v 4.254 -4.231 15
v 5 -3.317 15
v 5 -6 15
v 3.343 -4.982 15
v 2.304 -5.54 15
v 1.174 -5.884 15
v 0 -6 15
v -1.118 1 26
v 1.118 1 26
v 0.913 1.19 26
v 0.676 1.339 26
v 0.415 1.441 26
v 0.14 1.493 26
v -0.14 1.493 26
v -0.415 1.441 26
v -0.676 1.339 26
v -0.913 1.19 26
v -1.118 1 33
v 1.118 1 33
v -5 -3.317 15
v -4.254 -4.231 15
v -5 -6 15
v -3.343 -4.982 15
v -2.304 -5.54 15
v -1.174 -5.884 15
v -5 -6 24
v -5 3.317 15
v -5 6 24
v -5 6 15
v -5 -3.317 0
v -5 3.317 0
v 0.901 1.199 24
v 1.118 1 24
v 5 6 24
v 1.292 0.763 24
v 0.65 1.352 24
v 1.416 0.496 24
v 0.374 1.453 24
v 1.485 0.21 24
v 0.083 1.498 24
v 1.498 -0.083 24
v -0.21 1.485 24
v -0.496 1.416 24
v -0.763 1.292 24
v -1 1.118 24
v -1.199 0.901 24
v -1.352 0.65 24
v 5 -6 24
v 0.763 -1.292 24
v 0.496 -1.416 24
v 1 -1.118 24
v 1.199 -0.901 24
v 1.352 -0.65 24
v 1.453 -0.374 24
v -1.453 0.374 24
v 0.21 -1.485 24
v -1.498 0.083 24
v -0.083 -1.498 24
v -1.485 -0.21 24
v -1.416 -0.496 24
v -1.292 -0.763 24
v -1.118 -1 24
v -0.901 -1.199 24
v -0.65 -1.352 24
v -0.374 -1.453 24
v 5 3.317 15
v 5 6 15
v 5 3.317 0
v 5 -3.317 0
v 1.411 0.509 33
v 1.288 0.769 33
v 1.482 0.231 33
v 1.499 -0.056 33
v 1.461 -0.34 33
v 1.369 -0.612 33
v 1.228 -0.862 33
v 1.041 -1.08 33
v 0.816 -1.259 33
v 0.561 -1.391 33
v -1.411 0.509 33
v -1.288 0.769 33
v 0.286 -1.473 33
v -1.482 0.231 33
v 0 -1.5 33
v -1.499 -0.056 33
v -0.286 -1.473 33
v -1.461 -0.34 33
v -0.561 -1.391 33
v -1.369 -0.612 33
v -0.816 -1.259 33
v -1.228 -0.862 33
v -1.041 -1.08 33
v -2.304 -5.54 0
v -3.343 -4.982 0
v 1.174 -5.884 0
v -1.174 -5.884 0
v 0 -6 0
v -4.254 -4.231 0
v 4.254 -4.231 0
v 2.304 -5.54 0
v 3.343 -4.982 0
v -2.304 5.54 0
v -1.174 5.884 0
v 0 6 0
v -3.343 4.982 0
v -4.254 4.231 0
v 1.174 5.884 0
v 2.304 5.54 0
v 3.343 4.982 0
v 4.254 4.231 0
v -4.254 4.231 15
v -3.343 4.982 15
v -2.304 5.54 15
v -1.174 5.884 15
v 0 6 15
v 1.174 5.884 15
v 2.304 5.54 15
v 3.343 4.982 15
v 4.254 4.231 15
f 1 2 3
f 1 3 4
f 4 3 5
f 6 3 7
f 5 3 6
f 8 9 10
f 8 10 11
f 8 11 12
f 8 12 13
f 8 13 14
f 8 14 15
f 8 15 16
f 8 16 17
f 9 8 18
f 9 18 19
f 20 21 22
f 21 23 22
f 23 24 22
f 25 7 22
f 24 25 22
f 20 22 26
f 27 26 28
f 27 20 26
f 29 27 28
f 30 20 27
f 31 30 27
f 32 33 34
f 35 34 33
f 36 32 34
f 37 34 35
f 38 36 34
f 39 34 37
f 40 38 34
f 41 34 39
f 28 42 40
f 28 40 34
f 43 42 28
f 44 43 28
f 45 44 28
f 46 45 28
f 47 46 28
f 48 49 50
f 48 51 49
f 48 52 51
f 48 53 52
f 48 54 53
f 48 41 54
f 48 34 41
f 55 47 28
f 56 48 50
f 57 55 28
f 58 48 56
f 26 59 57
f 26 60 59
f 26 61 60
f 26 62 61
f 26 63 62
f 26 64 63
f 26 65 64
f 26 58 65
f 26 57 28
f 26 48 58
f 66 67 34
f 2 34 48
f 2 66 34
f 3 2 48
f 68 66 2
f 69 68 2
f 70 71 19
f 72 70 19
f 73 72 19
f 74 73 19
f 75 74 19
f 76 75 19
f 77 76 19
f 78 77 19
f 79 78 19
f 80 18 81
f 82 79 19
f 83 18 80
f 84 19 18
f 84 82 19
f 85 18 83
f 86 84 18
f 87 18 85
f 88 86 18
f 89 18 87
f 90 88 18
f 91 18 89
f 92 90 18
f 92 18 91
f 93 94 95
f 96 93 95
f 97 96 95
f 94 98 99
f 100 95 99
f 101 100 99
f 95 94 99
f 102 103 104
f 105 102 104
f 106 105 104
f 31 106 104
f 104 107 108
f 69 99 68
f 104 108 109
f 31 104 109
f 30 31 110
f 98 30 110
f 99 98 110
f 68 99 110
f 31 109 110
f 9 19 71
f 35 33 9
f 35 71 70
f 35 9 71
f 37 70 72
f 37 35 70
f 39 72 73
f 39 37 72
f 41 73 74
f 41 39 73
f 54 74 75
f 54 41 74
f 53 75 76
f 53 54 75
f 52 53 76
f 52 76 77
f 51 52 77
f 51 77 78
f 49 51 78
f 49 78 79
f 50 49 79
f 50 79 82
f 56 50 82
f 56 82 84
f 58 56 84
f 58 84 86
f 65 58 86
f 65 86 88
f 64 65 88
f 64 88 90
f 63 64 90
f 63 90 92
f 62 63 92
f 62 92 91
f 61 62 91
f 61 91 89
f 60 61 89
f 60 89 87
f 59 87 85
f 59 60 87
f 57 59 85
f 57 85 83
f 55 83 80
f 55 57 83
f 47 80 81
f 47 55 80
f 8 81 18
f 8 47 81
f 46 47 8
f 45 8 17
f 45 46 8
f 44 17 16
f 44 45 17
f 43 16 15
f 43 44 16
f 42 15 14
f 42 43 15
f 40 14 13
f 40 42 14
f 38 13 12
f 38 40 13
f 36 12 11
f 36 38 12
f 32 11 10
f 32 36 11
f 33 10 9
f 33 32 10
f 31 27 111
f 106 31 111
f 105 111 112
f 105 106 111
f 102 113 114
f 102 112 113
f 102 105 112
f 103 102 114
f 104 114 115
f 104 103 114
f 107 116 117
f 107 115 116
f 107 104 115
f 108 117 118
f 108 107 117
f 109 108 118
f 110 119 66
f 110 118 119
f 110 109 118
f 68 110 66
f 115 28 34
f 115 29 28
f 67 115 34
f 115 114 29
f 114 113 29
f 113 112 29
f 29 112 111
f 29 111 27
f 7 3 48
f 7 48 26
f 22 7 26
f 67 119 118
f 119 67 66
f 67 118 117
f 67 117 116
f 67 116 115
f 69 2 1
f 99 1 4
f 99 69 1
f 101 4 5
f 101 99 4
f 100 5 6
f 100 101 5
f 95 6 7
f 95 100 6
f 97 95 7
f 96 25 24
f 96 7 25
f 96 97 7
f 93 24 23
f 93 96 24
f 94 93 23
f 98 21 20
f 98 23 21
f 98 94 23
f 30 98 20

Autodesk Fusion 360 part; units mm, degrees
sketch "Sketch1" plane through (0, 0, 0) normal (0, 0, 1) x (1, 0, 0)
  circle A0 centre (0, 0) radius 6
  line L0 (5, -7) -> (-5, -7)
  line L1 (-5, -7) -> (-5, 7)
  line L2 (-5, 7) -> (5, 7)
  line L3 (5, 7) -> (5, -7)
  line L4 (5, -7) -> (-5, 7) construction
  line L5 (-5, -7) -> (5, 7) construction
  dimension "d1" = 12
extrude "Extrude1" add sketch "Sketch1" along normal blind 15 contours A0 L1 L3
sketch "Sketch2" plane through (0, 0, 0) normal (0, 0, 1) x (1, 0, 0)
  line L0 (5, -6) -> (-5, -6)
  line L1 (-5, -6) -> (-5, 6)
  line L2 (-5, 6) -> (5, 6)
  line L3 (5, 6) -> (5, -6)
  line L4 (5, -6) -> (-5, 6) construction
  line L5 (-5, -6) -> (5, 6) construction
sketch "Sketch3" plane through (0, 0, 0) normal (0, 0, 1) x (1, 0, 0)
sketch "Sketch4" plane through (0, 0, 0) normal (0, 0, 1) x (1, 0, 0)
sketch "Sketch5" plane through (0, 0, 15) normal (0, 0, 1) x (-1, 0, 0)
  arc A0 (5, 3.3166) -> (-5, 3.3166) centre (0, 0) ccw
  line L0 (-5, 3.3166) -> (-5, -3.3166)
  arc A1 (-5, -3.3166) -> (5, -3.3166) centre (0, 0) ccw
  line L1 (5, -3.3166) -> (5, 3.3166)
  line L2 (-5, 6) -> (5, 6)
  line L3 (5, 6) -> (5, -6)
  line L4 (5, -6) -> (-5, -6)
  line L5 (-5, -6) -> (-5, 6)
  line L6 (-5, 6) -> (5, -6) construction
  line L7 (5, 6) -> (-5, -6) construction
extrude "Extrude2" add sketch "Sketch5" along normal blind 9
sketch "Sketch6" plane through (0, 0, 24) normal (0, 0, 1) x (-1, 0, 0)
  line L0 (-5, -6) -> (5, -6)
  line L1 (5, -6) -> (5, 6)
  line L2 (5, 6) -> (-5, 6)
  line L3 (-5, 6) -> (-5, -6)
  circle A0 centre (0, 0) radius 1.5
  line L4 (0, 0) -> (0, -1)
  line L5 (0, -1) -> (-1.118, -1)
  line L6 (0, -1) -> (1.118, -1)
  line L7 (1.118, -1) -> (-1.118, -1)
  dimension "d6" = 3
extrude "Extrude3" add sketch "Sketch6" along normal blind 9 contours A0 L5 L6 L7 picked at (0.0074, 0.6639)
extrude "Extrude5" add sketch "Sketch6" along normal blind 2 contours A0 L5 L6 L7 picked at (0.0699, -1.3284)
extrude "Extrude4" [suppressed]
